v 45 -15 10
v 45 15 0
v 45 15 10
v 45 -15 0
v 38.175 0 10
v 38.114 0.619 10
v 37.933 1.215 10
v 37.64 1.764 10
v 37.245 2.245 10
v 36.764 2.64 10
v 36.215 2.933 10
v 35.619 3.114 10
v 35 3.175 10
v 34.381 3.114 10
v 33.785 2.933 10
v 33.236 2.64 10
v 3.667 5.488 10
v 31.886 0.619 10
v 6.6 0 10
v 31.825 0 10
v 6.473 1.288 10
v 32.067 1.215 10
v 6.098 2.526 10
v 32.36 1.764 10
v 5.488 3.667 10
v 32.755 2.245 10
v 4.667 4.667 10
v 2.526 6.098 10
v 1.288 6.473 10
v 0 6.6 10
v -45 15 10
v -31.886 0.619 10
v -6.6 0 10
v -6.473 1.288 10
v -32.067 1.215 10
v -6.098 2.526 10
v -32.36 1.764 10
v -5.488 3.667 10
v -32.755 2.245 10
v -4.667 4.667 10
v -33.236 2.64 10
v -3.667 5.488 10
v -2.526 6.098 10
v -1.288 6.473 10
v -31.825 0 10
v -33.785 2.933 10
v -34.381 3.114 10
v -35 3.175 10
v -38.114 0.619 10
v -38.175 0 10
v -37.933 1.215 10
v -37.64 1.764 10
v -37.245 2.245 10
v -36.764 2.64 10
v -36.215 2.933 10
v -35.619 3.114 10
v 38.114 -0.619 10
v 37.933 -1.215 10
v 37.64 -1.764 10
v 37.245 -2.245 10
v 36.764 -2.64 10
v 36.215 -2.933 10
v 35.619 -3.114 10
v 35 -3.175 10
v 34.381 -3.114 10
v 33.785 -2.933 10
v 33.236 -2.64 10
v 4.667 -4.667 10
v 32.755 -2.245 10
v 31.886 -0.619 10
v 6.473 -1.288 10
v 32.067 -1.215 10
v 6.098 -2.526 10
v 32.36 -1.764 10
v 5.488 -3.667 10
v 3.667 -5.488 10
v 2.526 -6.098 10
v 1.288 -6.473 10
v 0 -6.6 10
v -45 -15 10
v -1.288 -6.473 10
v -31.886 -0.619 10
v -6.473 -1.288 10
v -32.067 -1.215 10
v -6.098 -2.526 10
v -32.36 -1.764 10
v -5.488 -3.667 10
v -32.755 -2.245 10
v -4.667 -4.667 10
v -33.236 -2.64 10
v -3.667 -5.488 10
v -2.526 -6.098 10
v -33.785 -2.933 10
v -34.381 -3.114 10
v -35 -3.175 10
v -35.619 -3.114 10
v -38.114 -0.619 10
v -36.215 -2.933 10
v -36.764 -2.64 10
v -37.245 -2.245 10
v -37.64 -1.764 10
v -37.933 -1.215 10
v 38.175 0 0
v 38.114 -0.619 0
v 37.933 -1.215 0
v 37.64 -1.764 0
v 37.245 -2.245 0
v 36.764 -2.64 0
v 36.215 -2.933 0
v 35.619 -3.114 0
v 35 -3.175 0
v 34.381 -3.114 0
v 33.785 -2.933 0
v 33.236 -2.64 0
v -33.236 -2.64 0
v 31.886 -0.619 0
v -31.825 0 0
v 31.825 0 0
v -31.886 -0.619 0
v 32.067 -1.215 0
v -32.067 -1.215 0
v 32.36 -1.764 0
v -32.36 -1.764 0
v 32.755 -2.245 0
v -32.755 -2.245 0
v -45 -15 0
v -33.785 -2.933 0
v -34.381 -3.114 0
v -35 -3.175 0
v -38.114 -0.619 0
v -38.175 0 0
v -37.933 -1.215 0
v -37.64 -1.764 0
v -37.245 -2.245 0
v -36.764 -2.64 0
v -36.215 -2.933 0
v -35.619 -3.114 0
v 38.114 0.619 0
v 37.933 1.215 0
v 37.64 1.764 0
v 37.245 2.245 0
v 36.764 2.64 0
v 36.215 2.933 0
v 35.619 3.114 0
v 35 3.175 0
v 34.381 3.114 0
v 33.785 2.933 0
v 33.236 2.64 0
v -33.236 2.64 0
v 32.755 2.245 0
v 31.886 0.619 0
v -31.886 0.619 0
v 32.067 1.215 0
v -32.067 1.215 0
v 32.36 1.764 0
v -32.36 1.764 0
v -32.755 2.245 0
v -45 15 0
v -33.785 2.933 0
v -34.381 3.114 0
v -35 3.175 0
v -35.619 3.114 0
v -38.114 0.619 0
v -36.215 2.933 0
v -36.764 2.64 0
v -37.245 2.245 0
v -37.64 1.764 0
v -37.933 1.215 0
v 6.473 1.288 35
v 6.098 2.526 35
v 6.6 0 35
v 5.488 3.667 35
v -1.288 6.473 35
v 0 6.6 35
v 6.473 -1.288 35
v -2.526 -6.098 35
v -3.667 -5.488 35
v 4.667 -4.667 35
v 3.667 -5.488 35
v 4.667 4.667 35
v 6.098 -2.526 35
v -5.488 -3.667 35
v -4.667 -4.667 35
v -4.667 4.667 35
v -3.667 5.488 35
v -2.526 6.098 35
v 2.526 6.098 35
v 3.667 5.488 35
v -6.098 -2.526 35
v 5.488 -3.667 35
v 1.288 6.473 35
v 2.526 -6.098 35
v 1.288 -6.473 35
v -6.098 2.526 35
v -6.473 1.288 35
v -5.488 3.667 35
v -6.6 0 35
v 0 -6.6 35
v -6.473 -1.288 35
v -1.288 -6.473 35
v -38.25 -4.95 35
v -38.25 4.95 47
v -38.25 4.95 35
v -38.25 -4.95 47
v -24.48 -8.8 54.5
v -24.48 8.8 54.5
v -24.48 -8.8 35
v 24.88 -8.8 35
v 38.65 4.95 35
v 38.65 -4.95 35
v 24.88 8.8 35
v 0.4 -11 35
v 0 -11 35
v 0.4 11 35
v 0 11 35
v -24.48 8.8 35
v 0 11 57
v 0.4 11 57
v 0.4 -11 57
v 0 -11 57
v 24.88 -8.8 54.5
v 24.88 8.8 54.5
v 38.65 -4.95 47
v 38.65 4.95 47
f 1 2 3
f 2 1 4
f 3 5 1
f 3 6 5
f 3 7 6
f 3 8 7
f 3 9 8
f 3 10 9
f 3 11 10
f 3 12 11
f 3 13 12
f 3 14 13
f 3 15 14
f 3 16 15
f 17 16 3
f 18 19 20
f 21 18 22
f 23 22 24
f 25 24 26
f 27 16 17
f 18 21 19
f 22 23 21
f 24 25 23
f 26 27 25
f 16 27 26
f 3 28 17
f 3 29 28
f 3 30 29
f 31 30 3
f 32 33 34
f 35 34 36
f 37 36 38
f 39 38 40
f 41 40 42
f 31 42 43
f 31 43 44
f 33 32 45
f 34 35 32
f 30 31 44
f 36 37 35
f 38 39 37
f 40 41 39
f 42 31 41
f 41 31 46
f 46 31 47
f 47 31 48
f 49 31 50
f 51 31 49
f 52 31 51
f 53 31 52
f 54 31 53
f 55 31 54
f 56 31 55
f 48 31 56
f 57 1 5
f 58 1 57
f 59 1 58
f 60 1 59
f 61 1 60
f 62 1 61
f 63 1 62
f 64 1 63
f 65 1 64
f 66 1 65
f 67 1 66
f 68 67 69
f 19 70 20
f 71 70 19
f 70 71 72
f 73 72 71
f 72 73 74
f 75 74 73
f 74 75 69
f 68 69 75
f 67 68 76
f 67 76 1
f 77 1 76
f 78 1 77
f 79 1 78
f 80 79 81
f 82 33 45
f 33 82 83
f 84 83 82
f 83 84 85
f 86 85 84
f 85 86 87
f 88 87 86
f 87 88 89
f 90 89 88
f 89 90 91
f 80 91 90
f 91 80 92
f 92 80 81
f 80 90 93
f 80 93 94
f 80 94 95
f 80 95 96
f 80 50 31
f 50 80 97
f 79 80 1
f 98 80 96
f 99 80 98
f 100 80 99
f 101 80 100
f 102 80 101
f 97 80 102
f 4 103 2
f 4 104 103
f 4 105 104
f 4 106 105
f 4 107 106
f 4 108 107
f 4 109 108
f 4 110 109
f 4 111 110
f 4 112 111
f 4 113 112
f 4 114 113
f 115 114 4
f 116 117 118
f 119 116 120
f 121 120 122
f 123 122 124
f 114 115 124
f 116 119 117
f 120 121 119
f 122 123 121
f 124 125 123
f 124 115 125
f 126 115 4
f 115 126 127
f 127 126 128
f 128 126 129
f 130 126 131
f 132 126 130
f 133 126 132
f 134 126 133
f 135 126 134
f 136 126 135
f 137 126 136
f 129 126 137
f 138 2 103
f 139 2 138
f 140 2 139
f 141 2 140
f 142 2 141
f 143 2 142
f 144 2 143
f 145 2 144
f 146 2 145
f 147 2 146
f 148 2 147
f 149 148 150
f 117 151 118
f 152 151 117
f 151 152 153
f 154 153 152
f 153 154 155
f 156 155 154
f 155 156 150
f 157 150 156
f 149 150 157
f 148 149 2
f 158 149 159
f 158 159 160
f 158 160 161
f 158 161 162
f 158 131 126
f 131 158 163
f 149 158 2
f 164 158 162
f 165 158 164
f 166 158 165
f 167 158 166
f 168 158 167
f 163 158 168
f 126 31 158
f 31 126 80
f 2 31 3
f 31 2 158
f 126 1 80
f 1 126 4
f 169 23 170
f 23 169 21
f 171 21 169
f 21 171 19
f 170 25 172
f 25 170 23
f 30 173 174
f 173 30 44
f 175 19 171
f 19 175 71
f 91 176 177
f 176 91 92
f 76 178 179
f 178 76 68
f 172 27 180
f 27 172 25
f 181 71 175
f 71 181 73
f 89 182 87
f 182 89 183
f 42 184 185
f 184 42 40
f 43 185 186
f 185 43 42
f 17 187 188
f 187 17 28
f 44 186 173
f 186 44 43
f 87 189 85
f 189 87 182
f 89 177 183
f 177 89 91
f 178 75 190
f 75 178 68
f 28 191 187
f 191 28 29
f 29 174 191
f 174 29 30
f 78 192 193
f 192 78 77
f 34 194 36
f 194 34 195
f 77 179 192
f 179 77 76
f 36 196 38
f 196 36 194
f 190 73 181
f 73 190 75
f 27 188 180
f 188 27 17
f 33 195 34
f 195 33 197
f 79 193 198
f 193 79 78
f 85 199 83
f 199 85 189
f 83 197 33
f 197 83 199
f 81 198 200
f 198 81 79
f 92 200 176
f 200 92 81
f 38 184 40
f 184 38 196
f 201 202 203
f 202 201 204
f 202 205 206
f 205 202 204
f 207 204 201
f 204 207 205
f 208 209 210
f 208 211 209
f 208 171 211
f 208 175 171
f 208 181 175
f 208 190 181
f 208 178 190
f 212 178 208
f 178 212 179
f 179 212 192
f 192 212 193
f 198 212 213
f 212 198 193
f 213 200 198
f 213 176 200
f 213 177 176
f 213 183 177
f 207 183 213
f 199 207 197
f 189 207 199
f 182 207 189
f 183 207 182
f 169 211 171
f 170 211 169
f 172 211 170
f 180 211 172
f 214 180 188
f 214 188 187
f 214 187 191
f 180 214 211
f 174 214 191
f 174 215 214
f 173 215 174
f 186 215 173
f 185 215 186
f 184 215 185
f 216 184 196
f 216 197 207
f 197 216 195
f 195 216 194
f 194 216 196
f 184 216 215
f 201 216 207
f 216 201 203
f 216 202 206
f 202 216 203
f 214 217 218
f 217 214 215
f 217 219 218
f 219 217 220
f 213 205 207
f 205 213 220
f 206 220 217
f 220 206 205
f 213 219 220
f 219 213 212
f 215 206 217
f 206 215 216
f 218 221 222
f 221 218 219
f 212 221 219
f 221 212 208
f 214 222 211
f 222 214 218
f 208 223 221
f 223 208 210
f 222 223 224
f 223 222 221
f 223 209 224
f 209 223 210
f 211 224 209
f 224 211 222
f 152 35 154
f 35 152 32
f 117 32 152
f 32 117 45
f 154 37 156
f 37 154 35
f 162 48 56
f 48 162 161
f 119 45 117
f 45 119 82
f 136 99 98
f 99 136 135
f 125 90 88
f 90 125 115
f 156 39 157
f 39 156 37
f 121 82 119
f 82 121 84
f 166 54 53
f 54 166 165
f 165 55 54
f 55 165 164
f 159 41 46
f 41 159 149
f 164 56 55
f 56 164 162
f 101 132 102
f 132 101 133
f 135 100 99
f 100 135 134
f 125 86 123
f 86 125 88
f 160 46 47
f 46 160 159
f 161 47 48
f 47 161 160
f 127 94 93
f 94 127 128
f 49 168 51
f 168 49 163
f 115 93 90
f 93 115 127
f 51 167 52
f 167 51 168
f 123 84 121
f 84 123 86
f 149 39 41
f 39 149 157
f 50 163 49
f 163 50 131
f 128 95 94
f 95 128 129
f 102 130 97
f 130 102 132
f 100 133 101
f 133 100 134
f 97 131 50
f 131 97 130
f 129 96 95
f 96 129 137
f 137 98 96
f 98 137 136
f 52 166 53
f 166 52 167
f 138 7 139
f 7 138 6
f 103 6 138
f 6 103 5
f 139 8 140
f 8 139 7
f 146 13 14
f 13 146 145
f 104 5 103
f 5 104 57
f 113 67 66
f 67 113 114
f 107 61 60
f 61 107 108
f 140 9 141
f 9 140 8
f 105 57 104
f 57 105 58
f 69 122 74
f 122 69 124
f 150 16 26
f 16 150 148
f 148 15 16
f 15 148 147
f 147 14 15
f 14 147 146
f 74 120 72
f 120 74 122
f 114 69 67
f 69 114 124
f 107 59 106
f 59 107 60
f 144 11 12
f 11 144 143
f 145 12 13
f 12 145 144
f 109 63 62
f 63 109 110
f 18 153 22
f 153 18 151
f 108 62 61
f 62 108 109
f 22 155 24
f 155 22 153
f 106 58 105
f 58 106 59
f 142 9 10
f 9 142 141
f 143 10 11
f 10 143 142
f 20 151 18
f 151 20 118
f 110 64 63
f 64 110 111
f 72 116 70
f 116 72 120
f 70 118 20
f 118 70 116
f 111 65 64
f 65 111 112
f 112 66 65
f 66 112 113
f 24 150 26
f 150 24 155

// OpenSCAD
$fn = 32;

// ----------------------------------------------------------------------
// Boat cleat: 90 mm base, horn 46 mm up
// ----------------------------------------------------------------------

// --- parameters (mm) ---
base_l = 90;              // base length
base_w = 30;              // base width
base_t = 10;              // base thickness
horn_len = 76.5;          // horn length
horn_d = 22;              // horn diameter at the middle
horn_z = 46;              // horn axis height
end_drop = 10;            // how far the horn tips drop
post_d = 13.2;            // centre post diameter
holes_d = 6.35;           // fixing holes
hole_x = 35;              // fixing hole spacing

difference() {
  union() {
    translate([-45, -15, 0]) cube([base_l, base_w, base_t]);
    /* centre post, sunk 1 mm into the base */
    translate([0, 0, 9]) cylinder(h = 37, d = post_d);
    /* horn: a hull chain of boxes, full in the middle and lighter at the tips */
    hull() {
      translate([-38.25, -4.95, 35]) cube([0.4, 9.9, 12], center = false);
      translate([-24.48, -8.8, 35]) cube([0.4, 17.6, 19.5], center = false);
    }
    hull() {
      translate([-24.48, -8.8, 35]) cube([0.4, 17.6, 19.5], center = false);
      translate([0, -11, 35]) cube([0.4, 22, 22], center = false);
    }
    hull() {
      translate([0, -11, 35]) cube([0.4, 22, 22], center = false);
      translate([24.48, -8.8, 35]) cube([0.4, 17.6, 19.5], center = false);
    }
    hull() {
      translate([24.48, -8.8, 35]) cube([0.4, 17.6, 19.5], center = false);
      translate([38.25, -4.95, 35]) cube([0.4, 9.9, 12], center = false);
    }
  }
  translate([-35, 0, -2.5]) cylinder(h = base_t + 5, d = holes_d);
  translate([35, 0, -2.5]) cylinder(h = base_t + 5, d = holes_d);
}
